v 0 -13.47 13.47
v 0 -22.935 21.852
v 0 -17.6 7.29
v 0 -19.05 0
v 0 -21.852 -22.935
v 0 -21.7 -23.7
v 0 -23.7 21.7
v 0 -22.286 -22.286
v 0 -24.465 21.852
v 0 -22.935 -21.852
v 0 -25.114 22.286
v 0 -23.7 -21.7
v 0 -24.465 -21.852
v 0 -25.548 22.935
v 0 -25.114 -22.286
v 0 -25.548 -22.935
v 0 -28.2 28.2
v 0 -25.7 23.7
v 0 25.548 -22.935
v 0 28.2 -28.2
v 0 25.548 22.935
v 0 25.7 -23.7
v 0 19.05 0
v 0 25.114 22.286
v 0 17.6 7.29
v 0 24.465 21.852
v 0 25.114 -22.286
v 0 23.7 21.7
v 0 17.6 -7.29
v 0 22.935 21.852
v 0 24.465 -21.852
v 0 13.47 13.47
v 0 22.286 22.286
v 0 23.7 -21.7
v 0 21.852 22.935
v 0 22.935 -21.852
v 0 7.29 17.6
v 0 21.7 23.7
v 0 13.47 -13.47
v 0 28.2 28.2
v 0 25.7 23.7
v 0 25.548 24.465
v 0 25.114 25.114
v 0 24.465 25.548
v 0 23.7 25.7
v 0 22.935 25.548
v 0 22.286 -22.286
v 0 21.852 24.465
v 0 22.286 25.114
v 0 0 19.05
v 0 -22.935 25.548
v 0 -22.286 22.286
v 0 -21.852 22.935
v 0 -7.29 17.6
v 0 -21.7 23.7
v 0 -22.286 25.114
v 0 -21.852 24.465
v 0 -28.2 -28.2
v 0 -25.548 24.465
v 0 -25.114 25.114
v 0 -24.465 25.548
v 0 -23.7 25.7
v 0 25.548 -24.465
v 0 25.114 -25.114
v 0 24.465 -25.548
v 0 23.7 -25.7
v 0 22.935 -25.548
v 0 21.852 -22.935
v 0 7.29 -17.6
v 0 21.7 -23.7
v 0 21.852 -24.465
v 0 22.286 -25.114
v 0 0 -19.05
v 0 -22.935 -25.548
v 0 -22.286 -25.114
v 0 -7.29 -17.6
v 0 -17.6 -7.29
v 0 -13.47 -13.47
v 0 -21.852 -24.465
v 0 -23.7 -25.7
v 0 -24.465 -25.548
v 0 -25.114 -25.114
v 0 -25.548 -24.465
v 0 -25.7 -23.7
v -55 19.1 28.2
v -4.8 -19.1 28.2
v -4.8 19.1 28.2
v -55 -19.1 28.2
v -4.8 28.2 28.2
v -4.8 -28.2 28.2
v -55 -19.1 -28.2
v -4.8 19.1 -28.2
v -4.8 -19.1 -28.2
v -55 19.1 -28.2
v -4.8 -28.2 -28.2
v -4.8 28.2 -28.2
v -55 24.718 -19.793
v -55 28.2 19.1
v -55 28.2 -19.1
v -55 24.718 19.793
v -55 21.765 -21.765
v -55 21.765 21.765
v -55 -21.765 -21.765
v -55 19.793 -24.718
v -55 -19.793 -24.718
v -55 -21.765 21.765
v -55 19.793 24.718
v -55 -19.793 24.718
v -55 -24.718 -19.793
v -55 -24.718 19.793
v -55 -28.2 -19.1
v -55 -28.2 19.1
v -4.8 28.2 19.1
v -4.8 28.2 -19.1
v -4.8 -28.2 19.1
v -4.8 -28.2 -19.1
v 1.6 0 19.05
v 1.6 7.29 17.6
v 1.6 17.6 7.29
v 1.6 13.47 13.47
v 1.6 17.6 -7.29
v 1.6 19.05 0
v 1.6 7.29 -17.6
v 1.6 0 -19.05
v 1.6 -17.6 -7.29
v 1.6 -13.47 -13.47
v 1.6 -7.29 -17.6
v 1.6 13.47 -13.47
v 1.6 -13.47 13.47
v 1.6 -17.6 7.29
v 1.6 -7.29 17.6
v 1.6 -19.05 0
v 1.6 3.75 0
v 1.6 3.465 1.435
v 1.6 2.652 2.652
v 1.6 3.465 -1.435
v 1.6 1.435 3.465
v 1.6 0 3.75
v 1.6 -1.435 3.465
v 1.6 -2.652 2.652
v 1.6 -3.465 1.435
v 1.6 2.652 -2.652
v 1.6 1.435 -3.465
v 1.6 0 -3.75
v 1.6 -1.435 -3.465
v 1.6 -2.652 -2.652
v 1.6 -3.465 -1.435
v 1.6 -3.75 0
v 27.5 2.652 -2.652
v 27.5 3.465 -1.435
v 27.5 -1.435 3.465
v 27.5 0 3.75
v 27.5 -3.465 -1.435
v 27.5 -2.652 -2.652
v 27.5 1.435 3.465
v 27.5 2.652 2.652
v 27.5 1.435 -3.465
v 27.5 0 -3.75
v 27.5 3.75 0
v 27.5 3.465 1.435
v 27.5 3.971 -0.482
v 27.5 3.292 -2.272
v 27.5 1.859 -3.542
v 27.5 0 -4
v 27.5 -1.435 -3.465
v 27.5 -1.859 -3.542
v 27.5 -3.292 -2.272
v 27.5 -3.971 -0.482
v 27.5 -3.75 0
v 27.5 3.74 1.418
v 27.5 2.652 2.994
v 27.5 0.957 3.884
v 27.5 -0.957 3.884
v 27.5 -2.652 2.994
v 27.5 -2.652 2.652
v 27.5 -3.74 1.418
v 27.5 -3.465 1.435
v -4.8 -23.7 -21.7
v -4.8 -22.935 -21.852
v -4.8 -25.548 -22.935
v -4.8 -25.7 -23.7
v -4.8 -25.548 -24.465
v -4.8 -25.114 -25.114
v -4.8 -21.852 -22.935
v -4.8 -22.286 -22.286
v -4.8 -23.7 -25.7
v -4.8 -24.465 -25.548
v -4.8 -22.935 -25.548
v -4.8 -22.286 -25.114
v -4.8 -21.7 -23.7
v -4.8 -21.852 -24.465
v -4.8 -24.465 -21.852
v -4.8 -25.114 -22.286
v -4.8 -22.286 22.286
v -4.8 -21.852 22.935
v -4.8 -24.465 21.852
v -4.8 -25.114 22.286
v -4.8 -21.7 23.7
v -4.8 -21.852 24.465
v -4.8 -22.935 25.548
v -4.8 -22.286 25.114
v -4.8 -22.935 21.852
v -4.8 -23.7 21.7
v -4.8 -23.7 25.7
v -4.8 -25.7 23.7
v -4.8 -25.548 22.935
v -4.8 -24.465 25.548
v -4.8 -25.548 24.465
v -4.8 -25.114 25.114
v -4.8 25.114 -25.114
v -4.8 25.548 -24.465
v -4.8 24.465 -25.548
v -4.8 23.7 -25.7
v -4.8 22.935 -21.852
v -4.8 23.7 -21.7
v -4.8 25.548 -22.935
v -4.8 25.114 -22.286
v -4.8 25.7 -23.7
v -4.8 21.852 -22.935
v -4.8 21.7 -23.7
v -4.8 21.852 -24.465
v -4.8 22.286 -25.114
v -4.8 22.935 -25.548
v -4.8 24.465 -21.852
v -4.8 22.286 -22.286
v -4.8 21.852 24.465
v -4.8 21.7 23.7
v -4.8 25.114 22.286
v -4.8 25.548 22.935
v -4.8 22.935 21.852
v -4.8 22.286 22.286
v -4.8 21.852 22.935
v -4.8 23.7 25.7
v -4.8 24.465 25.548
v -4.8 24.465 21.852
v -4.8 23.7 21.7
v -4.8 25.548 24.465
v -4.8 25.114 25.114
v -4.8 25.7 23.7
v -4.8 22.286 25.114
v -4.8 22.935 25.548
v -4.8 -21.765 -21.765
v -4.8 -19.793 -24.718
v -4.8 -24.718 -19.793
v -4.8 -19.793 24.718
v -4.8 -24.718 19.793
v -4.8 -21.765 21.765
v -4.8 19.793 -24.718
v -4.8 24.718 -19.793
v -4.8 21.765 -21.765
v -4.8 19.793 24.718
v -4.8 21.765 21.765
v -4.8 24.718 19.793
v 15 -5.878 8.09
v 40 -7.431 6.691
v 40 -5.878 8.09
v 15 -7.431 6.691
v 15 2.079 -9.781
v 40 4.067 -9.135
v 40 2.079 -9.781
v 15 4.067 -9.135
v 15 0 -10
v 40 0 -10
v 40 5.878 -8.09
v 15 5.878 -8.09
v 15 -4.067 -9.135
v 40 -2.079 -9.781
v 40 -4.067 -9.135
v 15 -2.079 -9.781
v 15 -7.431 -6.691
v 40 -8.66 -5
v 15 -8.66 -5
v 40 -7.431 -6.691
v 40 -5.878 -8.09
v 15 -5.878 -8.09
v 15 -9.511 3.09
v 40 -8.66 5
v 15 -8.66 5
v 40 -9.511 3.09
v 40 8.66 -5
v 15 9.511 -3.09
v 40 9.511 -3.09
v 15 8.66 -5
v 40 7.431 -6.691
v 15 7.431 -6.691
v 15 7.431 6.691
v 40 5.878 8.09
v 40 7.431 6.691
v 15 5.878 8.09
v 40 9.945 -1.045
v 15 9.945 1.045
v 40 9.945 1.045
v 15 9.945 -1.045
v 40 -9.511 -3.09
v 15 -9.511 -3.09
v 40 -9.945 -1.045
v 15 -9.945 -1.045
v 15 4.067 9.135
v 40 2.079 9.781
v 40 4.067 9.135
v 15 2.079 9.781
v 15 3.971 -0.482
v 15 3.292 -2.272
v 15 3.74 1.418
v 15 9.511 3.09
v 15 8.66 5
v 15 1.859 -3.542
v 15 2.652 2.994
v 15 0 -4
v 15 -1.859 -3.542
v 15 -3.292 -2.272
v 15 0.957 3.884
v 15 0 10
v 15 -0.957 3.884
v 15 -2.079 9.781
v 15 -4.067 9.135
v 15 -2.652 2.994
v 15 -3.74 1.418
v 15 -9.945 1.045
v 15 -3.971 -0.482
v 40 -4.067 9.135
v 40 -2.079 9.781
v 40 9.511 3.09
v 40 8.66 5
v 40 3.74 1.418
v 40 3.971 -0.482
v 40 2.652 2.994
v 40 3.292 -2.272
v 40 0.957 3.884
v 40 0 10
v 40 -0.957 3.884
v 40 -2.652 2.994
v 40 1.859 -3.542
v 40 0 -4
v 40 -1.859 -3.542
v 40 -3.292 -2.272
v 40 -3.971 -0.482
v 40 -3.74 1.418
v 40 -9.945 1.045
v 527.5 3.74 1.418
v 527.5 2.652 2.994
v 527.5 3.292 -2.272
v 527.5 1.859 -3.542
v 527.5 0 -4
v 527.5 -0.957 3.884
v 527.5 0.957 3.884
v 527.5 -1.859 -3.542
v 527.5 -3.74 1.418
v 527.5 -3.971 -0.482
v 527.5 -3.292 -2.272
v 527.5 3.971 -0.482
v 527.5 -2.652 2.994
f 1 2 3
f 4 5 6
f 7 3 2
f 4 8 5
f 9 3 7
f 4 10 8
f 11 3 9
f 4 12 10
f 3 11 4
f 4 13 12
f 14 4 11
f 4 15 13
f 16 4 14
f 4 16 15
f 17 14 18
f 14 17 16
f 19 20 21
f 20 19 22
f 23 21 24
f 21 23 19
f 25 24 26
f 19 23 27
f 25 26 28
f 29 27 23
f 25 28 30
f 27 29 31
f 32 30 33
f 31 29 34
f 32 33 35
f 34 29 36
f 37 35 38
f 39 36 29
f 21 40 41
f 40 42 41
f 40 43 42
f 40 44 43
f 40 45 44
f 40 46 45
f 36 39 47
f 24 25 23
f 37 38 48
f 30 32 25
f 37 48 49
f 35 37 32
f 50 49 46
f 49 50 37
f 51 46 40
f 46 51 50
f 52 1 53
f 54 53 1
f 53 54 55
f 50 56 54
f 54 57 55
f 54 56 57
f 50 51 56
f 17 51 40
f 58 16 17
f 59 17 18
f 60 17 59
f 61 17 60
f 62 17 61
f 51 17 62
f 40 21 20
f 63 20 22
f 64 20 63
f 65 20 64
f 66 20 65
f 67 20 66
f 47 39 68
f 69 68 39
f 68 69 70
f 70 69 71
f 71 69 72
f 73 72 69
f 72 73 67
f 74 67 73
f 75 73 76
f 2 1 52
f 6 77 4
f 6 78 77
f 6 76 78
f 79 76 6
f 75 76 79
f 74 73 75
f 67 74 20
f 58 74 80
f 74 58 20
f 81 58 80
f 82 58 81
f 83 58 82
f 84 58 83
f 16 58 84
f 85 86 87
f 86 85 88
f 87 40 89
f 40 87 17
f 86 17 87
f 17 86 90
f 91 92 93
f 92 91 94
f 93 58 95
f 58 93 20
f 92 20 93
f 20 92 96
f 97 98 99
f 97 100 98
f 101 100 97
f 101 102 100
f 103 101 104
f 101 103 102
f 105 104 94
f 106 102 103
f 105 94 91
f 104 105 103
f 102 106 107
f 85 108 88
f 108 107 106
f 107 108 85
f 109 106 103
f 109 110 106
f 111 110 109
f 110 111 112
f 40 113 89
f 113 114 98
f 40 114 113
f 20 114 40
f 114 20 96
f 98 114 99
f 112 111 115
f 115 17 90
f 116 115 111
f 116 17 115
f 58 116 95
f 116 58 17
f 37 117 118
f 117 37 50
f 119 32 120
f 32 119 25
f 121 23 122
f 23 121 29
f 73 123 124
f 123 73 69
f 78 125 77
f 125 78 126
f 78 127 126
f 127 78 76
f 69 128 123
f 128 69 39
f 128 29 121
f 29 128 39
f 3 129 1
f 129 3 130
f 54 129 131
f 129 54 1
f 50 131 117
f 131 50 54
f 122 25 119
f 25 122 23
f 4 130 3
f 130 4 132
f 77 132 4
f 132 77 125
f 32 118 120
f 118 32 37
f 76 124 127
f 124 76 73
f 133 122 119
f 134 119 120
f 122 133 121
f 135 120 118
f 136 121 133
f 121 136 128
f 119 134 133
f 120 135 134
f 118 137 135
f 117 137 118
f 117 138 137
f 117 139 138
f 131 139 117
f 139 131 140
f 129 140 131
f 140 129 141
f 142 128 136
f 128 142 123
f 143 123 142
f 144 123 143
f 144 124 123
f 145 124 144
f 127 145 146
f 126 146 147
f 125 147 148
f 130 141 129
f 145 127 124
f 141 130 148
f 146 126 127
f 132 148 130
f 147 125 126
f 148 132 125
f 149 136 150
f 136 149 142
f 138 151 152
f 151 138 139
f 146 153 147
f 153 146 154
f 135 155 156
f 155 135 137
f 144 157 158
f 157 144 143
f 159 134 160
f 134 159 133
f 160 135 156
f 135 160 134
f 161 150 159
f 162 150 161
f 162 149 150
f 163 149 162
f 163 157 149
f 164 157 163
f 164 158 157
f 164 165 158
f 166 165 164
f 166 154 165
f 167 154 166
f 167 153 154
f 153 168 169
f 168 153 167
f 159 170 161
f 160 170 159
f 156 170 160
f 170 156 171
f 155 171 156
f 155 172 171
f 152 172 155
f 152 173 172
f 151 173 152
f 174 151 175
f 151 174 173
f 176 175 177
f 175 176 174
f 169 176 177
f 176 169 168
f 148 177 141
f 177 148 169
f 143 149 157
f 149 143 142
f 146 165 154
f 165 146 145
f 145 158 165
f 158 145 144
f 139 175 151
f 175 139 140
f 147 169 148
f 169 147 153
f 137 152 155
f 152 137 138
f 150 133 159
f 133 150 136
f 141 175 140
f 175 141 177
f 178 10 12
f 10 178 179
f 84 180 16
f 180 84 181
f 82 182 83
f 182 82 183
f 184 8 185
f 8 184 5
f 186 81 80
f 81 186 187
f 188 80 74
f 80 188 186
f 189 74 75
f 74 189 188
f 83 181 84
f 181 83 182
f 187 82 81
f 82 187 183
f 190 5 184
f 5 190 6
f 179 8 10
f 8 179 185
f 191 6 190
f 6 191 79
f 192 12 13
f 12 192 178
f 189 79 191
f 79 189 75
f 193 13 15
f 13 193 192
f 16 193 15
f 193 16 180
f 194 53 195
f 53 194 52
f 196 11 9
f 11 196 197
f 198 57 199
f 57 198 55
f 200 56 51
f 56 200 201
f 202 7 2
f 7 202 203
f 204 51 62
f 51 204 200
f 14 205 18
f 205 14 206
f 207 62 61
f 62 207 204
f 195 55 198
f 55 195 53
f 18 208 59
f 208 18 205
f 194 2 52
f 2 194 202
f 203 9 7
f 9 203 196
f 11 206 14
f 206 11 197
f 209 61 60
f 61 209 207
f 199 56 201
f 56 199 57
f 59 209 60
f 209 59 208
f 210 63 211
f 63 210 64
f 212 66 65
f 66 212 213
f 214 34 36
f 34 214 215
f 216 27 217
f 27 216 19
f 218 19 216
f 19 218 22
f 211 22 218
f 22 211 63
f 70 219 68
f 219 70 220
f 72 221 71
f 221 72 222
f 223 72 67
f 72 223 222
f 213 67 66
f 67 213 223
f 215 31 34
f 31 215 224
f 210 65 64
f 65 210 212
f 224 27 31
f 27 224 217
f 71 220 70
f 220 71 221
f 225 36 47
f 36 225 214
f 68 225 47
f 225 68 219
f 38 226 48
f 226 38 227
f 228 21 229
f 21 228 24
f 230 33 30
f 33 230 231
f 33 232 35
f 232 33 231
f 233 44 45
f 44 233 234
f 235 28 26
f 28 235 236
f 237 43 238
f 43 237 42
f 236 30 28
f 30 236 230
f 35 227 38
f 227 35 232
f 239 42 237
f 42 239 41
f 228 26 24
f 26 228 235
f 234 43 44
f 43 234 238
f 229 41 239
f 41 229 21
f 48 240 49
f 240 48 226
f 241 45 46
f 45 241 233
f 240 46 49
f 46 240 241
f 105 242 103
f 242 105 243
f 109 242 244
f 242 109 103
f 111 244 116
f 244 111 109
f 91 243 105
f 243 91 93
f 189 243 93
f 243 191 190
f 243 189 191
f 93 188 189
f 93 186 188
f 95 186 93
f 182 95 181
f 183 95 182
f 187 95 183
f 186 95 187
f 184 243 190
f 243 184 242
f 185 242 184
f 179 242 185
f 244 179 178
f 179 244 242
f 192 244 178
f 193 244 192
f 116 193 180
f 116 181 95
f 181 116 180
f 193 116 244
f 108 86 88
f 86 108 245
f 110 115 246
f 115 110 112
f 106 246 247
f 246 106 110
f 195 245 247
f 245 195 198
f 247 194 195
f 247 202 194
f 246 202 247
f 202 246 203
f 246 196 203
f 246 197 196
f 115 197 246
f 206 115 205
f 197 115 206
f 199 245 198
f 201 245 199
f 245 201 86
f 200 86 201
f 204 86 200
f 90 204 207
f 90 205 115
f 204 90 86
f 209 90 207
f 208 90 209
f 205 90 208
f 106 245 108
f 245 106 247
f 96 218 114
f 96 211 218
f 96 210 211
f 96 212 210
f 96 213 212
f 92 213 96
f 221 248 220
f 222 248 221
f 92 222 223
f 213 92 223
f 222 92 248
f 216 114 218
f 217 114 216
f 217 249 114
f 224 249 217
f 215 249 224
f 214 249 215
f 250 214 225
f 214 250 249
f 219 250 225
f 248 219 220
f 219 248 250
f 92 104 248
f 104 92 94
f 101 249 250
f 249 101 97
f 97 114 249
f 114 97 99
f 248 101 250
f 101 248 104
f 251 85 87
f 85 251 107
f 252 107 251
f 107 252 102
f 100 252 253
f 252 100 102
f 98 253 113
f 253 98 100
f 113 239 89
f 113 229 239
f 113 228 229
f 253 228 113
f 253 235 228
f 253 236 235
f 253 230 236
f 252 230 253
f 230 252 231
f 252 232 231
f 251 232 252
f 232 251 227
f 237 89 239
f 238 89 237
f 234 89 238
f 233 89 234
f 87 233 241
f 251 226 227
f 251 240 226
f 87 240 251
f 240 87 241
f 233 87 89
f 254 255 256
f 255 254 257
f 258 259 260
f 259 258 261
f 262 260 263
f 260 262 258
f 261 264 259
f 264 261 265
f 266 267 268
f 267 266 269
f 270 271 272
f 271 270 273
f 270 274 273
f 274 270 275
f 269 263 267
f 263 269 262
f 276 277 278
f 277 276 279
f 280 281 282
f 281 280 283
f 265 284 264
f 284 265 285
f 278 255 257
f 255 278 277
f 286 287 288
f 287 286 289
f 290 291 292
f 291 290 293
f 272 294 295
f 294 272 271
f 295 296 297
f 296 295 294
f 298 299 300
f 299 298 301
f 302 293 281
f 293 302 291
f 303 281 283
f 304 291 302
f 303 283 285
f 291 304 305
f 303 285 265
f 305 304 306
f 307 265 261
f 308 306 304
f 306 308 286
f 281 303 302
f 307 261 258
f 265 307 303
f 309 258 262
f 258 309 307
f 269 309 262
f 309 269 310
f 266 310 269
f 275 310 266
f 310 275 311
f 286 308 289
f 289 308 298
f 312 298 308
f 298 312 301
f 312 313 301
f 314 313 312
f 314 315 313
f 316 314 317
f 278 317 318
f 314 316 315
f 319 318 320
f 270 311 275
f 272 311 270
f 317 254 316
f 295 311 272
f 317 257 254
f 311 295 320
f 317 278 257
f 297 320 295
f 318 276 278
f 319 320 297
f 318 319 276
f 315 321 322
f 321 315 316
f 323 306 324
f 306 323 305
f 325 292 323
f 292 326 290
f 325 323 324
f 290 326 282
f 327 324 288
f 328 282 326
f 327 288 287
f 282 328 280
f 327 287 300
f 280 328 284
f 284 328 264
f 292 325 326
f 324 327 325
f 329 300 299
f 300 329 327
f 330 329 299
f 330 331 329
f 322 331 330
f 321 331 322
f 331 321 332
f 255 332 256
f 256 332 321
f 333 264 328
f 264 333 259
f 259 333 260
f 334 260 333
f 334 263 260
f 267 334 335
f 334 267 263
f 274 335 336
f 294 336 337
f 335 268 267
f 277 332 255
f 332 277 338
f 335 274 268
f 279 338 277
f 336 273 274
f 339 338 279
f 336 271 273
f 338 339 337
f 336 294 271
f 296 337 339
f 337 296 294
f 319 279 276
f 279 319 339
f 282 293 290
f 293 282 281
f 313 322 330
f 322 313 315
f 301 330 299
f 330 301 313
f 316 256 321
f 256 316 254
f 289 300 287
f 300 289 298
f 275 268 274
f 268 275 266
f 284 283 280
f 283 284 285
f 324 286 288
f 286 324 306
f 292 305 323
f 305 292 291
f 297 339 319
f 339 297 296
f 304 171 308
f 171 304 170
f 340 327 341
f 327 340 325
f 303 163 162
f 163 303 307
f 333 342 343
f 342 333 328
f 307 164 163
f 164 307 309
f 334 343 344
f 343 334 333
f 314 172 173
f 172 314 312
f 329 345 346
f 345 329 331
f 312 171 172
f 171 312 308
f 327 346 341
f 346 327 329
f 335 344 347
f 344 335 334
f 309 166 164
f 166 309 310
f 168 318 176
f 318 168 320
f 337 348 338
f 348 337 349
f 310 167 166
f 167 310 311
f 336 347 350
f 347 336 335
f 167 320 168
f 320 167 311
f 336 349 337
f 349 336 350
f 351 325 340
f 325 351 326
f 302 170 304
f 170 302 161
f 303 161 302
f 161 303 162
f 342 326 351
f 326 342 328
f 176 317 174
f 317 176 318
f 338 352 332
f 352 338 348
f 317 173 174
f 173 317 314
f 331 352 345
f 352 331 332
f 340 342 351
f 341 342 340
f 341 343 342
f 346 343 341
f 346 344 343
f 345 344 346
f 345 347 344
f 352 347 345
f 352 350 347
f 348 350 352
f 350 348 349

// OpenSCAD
module nema23(center = false){
     
    translate(center ? [-55, -28.2,-28.2] : [-55,0,0])
    difference(){
        union(){
            cube([55,56.4,56.4]);
            
            
            translate([55,28.2,28.2])
            rotate([0,90,0])
            cylinder(d=38.1, h = 1.6, $fn= 16);
            
            translate([55,28.2,28.2])
            rotate([0,90,0])
            cylinder(d=7.5, h = 27.5, $fn= 16);
        }
   
        //mounts
        for (dx = [-47.4/2, +47.4/2]){
            for (dy = [-47.4/2, +47.4/2]){
                
                translate([-20,28.2 + dx,28.2 +dy])
                rotate([0,90,0])
                //M4
                cylinder(d=4, h = 100, $fn=16);
            }
        }
        
        for (dx = [-28.2, 28.2]){
            for (dy = [-28.2, +28.2]){
                
                translate([-10,28.2 + dx,28.2 + dy])
                rotate([0,90,0])
                cylinder(r=9.1, h = 55 + 10 - 4.8, $fn=16);
            }
        }
        
   }
}

module nema23_with_mounted(){
    
    nema23(center= true);
    translate([27.5,0,0])
    children([0:$children-1]);
    
}


module t8_coupler(){
    rotate([0,90,0])
    difference(){
        cylinder(d = 20, h= 25, center = true);
        cylinder(d = 8, h = 35, center = true);
    }
}

module t8_lead_screw(length){

    rotate([0,90,0])
    cylinder(d=8, h = length);
}

nema23_with_mounted(){
    t8_lead_screw(500);
    t8_coupler();
}
